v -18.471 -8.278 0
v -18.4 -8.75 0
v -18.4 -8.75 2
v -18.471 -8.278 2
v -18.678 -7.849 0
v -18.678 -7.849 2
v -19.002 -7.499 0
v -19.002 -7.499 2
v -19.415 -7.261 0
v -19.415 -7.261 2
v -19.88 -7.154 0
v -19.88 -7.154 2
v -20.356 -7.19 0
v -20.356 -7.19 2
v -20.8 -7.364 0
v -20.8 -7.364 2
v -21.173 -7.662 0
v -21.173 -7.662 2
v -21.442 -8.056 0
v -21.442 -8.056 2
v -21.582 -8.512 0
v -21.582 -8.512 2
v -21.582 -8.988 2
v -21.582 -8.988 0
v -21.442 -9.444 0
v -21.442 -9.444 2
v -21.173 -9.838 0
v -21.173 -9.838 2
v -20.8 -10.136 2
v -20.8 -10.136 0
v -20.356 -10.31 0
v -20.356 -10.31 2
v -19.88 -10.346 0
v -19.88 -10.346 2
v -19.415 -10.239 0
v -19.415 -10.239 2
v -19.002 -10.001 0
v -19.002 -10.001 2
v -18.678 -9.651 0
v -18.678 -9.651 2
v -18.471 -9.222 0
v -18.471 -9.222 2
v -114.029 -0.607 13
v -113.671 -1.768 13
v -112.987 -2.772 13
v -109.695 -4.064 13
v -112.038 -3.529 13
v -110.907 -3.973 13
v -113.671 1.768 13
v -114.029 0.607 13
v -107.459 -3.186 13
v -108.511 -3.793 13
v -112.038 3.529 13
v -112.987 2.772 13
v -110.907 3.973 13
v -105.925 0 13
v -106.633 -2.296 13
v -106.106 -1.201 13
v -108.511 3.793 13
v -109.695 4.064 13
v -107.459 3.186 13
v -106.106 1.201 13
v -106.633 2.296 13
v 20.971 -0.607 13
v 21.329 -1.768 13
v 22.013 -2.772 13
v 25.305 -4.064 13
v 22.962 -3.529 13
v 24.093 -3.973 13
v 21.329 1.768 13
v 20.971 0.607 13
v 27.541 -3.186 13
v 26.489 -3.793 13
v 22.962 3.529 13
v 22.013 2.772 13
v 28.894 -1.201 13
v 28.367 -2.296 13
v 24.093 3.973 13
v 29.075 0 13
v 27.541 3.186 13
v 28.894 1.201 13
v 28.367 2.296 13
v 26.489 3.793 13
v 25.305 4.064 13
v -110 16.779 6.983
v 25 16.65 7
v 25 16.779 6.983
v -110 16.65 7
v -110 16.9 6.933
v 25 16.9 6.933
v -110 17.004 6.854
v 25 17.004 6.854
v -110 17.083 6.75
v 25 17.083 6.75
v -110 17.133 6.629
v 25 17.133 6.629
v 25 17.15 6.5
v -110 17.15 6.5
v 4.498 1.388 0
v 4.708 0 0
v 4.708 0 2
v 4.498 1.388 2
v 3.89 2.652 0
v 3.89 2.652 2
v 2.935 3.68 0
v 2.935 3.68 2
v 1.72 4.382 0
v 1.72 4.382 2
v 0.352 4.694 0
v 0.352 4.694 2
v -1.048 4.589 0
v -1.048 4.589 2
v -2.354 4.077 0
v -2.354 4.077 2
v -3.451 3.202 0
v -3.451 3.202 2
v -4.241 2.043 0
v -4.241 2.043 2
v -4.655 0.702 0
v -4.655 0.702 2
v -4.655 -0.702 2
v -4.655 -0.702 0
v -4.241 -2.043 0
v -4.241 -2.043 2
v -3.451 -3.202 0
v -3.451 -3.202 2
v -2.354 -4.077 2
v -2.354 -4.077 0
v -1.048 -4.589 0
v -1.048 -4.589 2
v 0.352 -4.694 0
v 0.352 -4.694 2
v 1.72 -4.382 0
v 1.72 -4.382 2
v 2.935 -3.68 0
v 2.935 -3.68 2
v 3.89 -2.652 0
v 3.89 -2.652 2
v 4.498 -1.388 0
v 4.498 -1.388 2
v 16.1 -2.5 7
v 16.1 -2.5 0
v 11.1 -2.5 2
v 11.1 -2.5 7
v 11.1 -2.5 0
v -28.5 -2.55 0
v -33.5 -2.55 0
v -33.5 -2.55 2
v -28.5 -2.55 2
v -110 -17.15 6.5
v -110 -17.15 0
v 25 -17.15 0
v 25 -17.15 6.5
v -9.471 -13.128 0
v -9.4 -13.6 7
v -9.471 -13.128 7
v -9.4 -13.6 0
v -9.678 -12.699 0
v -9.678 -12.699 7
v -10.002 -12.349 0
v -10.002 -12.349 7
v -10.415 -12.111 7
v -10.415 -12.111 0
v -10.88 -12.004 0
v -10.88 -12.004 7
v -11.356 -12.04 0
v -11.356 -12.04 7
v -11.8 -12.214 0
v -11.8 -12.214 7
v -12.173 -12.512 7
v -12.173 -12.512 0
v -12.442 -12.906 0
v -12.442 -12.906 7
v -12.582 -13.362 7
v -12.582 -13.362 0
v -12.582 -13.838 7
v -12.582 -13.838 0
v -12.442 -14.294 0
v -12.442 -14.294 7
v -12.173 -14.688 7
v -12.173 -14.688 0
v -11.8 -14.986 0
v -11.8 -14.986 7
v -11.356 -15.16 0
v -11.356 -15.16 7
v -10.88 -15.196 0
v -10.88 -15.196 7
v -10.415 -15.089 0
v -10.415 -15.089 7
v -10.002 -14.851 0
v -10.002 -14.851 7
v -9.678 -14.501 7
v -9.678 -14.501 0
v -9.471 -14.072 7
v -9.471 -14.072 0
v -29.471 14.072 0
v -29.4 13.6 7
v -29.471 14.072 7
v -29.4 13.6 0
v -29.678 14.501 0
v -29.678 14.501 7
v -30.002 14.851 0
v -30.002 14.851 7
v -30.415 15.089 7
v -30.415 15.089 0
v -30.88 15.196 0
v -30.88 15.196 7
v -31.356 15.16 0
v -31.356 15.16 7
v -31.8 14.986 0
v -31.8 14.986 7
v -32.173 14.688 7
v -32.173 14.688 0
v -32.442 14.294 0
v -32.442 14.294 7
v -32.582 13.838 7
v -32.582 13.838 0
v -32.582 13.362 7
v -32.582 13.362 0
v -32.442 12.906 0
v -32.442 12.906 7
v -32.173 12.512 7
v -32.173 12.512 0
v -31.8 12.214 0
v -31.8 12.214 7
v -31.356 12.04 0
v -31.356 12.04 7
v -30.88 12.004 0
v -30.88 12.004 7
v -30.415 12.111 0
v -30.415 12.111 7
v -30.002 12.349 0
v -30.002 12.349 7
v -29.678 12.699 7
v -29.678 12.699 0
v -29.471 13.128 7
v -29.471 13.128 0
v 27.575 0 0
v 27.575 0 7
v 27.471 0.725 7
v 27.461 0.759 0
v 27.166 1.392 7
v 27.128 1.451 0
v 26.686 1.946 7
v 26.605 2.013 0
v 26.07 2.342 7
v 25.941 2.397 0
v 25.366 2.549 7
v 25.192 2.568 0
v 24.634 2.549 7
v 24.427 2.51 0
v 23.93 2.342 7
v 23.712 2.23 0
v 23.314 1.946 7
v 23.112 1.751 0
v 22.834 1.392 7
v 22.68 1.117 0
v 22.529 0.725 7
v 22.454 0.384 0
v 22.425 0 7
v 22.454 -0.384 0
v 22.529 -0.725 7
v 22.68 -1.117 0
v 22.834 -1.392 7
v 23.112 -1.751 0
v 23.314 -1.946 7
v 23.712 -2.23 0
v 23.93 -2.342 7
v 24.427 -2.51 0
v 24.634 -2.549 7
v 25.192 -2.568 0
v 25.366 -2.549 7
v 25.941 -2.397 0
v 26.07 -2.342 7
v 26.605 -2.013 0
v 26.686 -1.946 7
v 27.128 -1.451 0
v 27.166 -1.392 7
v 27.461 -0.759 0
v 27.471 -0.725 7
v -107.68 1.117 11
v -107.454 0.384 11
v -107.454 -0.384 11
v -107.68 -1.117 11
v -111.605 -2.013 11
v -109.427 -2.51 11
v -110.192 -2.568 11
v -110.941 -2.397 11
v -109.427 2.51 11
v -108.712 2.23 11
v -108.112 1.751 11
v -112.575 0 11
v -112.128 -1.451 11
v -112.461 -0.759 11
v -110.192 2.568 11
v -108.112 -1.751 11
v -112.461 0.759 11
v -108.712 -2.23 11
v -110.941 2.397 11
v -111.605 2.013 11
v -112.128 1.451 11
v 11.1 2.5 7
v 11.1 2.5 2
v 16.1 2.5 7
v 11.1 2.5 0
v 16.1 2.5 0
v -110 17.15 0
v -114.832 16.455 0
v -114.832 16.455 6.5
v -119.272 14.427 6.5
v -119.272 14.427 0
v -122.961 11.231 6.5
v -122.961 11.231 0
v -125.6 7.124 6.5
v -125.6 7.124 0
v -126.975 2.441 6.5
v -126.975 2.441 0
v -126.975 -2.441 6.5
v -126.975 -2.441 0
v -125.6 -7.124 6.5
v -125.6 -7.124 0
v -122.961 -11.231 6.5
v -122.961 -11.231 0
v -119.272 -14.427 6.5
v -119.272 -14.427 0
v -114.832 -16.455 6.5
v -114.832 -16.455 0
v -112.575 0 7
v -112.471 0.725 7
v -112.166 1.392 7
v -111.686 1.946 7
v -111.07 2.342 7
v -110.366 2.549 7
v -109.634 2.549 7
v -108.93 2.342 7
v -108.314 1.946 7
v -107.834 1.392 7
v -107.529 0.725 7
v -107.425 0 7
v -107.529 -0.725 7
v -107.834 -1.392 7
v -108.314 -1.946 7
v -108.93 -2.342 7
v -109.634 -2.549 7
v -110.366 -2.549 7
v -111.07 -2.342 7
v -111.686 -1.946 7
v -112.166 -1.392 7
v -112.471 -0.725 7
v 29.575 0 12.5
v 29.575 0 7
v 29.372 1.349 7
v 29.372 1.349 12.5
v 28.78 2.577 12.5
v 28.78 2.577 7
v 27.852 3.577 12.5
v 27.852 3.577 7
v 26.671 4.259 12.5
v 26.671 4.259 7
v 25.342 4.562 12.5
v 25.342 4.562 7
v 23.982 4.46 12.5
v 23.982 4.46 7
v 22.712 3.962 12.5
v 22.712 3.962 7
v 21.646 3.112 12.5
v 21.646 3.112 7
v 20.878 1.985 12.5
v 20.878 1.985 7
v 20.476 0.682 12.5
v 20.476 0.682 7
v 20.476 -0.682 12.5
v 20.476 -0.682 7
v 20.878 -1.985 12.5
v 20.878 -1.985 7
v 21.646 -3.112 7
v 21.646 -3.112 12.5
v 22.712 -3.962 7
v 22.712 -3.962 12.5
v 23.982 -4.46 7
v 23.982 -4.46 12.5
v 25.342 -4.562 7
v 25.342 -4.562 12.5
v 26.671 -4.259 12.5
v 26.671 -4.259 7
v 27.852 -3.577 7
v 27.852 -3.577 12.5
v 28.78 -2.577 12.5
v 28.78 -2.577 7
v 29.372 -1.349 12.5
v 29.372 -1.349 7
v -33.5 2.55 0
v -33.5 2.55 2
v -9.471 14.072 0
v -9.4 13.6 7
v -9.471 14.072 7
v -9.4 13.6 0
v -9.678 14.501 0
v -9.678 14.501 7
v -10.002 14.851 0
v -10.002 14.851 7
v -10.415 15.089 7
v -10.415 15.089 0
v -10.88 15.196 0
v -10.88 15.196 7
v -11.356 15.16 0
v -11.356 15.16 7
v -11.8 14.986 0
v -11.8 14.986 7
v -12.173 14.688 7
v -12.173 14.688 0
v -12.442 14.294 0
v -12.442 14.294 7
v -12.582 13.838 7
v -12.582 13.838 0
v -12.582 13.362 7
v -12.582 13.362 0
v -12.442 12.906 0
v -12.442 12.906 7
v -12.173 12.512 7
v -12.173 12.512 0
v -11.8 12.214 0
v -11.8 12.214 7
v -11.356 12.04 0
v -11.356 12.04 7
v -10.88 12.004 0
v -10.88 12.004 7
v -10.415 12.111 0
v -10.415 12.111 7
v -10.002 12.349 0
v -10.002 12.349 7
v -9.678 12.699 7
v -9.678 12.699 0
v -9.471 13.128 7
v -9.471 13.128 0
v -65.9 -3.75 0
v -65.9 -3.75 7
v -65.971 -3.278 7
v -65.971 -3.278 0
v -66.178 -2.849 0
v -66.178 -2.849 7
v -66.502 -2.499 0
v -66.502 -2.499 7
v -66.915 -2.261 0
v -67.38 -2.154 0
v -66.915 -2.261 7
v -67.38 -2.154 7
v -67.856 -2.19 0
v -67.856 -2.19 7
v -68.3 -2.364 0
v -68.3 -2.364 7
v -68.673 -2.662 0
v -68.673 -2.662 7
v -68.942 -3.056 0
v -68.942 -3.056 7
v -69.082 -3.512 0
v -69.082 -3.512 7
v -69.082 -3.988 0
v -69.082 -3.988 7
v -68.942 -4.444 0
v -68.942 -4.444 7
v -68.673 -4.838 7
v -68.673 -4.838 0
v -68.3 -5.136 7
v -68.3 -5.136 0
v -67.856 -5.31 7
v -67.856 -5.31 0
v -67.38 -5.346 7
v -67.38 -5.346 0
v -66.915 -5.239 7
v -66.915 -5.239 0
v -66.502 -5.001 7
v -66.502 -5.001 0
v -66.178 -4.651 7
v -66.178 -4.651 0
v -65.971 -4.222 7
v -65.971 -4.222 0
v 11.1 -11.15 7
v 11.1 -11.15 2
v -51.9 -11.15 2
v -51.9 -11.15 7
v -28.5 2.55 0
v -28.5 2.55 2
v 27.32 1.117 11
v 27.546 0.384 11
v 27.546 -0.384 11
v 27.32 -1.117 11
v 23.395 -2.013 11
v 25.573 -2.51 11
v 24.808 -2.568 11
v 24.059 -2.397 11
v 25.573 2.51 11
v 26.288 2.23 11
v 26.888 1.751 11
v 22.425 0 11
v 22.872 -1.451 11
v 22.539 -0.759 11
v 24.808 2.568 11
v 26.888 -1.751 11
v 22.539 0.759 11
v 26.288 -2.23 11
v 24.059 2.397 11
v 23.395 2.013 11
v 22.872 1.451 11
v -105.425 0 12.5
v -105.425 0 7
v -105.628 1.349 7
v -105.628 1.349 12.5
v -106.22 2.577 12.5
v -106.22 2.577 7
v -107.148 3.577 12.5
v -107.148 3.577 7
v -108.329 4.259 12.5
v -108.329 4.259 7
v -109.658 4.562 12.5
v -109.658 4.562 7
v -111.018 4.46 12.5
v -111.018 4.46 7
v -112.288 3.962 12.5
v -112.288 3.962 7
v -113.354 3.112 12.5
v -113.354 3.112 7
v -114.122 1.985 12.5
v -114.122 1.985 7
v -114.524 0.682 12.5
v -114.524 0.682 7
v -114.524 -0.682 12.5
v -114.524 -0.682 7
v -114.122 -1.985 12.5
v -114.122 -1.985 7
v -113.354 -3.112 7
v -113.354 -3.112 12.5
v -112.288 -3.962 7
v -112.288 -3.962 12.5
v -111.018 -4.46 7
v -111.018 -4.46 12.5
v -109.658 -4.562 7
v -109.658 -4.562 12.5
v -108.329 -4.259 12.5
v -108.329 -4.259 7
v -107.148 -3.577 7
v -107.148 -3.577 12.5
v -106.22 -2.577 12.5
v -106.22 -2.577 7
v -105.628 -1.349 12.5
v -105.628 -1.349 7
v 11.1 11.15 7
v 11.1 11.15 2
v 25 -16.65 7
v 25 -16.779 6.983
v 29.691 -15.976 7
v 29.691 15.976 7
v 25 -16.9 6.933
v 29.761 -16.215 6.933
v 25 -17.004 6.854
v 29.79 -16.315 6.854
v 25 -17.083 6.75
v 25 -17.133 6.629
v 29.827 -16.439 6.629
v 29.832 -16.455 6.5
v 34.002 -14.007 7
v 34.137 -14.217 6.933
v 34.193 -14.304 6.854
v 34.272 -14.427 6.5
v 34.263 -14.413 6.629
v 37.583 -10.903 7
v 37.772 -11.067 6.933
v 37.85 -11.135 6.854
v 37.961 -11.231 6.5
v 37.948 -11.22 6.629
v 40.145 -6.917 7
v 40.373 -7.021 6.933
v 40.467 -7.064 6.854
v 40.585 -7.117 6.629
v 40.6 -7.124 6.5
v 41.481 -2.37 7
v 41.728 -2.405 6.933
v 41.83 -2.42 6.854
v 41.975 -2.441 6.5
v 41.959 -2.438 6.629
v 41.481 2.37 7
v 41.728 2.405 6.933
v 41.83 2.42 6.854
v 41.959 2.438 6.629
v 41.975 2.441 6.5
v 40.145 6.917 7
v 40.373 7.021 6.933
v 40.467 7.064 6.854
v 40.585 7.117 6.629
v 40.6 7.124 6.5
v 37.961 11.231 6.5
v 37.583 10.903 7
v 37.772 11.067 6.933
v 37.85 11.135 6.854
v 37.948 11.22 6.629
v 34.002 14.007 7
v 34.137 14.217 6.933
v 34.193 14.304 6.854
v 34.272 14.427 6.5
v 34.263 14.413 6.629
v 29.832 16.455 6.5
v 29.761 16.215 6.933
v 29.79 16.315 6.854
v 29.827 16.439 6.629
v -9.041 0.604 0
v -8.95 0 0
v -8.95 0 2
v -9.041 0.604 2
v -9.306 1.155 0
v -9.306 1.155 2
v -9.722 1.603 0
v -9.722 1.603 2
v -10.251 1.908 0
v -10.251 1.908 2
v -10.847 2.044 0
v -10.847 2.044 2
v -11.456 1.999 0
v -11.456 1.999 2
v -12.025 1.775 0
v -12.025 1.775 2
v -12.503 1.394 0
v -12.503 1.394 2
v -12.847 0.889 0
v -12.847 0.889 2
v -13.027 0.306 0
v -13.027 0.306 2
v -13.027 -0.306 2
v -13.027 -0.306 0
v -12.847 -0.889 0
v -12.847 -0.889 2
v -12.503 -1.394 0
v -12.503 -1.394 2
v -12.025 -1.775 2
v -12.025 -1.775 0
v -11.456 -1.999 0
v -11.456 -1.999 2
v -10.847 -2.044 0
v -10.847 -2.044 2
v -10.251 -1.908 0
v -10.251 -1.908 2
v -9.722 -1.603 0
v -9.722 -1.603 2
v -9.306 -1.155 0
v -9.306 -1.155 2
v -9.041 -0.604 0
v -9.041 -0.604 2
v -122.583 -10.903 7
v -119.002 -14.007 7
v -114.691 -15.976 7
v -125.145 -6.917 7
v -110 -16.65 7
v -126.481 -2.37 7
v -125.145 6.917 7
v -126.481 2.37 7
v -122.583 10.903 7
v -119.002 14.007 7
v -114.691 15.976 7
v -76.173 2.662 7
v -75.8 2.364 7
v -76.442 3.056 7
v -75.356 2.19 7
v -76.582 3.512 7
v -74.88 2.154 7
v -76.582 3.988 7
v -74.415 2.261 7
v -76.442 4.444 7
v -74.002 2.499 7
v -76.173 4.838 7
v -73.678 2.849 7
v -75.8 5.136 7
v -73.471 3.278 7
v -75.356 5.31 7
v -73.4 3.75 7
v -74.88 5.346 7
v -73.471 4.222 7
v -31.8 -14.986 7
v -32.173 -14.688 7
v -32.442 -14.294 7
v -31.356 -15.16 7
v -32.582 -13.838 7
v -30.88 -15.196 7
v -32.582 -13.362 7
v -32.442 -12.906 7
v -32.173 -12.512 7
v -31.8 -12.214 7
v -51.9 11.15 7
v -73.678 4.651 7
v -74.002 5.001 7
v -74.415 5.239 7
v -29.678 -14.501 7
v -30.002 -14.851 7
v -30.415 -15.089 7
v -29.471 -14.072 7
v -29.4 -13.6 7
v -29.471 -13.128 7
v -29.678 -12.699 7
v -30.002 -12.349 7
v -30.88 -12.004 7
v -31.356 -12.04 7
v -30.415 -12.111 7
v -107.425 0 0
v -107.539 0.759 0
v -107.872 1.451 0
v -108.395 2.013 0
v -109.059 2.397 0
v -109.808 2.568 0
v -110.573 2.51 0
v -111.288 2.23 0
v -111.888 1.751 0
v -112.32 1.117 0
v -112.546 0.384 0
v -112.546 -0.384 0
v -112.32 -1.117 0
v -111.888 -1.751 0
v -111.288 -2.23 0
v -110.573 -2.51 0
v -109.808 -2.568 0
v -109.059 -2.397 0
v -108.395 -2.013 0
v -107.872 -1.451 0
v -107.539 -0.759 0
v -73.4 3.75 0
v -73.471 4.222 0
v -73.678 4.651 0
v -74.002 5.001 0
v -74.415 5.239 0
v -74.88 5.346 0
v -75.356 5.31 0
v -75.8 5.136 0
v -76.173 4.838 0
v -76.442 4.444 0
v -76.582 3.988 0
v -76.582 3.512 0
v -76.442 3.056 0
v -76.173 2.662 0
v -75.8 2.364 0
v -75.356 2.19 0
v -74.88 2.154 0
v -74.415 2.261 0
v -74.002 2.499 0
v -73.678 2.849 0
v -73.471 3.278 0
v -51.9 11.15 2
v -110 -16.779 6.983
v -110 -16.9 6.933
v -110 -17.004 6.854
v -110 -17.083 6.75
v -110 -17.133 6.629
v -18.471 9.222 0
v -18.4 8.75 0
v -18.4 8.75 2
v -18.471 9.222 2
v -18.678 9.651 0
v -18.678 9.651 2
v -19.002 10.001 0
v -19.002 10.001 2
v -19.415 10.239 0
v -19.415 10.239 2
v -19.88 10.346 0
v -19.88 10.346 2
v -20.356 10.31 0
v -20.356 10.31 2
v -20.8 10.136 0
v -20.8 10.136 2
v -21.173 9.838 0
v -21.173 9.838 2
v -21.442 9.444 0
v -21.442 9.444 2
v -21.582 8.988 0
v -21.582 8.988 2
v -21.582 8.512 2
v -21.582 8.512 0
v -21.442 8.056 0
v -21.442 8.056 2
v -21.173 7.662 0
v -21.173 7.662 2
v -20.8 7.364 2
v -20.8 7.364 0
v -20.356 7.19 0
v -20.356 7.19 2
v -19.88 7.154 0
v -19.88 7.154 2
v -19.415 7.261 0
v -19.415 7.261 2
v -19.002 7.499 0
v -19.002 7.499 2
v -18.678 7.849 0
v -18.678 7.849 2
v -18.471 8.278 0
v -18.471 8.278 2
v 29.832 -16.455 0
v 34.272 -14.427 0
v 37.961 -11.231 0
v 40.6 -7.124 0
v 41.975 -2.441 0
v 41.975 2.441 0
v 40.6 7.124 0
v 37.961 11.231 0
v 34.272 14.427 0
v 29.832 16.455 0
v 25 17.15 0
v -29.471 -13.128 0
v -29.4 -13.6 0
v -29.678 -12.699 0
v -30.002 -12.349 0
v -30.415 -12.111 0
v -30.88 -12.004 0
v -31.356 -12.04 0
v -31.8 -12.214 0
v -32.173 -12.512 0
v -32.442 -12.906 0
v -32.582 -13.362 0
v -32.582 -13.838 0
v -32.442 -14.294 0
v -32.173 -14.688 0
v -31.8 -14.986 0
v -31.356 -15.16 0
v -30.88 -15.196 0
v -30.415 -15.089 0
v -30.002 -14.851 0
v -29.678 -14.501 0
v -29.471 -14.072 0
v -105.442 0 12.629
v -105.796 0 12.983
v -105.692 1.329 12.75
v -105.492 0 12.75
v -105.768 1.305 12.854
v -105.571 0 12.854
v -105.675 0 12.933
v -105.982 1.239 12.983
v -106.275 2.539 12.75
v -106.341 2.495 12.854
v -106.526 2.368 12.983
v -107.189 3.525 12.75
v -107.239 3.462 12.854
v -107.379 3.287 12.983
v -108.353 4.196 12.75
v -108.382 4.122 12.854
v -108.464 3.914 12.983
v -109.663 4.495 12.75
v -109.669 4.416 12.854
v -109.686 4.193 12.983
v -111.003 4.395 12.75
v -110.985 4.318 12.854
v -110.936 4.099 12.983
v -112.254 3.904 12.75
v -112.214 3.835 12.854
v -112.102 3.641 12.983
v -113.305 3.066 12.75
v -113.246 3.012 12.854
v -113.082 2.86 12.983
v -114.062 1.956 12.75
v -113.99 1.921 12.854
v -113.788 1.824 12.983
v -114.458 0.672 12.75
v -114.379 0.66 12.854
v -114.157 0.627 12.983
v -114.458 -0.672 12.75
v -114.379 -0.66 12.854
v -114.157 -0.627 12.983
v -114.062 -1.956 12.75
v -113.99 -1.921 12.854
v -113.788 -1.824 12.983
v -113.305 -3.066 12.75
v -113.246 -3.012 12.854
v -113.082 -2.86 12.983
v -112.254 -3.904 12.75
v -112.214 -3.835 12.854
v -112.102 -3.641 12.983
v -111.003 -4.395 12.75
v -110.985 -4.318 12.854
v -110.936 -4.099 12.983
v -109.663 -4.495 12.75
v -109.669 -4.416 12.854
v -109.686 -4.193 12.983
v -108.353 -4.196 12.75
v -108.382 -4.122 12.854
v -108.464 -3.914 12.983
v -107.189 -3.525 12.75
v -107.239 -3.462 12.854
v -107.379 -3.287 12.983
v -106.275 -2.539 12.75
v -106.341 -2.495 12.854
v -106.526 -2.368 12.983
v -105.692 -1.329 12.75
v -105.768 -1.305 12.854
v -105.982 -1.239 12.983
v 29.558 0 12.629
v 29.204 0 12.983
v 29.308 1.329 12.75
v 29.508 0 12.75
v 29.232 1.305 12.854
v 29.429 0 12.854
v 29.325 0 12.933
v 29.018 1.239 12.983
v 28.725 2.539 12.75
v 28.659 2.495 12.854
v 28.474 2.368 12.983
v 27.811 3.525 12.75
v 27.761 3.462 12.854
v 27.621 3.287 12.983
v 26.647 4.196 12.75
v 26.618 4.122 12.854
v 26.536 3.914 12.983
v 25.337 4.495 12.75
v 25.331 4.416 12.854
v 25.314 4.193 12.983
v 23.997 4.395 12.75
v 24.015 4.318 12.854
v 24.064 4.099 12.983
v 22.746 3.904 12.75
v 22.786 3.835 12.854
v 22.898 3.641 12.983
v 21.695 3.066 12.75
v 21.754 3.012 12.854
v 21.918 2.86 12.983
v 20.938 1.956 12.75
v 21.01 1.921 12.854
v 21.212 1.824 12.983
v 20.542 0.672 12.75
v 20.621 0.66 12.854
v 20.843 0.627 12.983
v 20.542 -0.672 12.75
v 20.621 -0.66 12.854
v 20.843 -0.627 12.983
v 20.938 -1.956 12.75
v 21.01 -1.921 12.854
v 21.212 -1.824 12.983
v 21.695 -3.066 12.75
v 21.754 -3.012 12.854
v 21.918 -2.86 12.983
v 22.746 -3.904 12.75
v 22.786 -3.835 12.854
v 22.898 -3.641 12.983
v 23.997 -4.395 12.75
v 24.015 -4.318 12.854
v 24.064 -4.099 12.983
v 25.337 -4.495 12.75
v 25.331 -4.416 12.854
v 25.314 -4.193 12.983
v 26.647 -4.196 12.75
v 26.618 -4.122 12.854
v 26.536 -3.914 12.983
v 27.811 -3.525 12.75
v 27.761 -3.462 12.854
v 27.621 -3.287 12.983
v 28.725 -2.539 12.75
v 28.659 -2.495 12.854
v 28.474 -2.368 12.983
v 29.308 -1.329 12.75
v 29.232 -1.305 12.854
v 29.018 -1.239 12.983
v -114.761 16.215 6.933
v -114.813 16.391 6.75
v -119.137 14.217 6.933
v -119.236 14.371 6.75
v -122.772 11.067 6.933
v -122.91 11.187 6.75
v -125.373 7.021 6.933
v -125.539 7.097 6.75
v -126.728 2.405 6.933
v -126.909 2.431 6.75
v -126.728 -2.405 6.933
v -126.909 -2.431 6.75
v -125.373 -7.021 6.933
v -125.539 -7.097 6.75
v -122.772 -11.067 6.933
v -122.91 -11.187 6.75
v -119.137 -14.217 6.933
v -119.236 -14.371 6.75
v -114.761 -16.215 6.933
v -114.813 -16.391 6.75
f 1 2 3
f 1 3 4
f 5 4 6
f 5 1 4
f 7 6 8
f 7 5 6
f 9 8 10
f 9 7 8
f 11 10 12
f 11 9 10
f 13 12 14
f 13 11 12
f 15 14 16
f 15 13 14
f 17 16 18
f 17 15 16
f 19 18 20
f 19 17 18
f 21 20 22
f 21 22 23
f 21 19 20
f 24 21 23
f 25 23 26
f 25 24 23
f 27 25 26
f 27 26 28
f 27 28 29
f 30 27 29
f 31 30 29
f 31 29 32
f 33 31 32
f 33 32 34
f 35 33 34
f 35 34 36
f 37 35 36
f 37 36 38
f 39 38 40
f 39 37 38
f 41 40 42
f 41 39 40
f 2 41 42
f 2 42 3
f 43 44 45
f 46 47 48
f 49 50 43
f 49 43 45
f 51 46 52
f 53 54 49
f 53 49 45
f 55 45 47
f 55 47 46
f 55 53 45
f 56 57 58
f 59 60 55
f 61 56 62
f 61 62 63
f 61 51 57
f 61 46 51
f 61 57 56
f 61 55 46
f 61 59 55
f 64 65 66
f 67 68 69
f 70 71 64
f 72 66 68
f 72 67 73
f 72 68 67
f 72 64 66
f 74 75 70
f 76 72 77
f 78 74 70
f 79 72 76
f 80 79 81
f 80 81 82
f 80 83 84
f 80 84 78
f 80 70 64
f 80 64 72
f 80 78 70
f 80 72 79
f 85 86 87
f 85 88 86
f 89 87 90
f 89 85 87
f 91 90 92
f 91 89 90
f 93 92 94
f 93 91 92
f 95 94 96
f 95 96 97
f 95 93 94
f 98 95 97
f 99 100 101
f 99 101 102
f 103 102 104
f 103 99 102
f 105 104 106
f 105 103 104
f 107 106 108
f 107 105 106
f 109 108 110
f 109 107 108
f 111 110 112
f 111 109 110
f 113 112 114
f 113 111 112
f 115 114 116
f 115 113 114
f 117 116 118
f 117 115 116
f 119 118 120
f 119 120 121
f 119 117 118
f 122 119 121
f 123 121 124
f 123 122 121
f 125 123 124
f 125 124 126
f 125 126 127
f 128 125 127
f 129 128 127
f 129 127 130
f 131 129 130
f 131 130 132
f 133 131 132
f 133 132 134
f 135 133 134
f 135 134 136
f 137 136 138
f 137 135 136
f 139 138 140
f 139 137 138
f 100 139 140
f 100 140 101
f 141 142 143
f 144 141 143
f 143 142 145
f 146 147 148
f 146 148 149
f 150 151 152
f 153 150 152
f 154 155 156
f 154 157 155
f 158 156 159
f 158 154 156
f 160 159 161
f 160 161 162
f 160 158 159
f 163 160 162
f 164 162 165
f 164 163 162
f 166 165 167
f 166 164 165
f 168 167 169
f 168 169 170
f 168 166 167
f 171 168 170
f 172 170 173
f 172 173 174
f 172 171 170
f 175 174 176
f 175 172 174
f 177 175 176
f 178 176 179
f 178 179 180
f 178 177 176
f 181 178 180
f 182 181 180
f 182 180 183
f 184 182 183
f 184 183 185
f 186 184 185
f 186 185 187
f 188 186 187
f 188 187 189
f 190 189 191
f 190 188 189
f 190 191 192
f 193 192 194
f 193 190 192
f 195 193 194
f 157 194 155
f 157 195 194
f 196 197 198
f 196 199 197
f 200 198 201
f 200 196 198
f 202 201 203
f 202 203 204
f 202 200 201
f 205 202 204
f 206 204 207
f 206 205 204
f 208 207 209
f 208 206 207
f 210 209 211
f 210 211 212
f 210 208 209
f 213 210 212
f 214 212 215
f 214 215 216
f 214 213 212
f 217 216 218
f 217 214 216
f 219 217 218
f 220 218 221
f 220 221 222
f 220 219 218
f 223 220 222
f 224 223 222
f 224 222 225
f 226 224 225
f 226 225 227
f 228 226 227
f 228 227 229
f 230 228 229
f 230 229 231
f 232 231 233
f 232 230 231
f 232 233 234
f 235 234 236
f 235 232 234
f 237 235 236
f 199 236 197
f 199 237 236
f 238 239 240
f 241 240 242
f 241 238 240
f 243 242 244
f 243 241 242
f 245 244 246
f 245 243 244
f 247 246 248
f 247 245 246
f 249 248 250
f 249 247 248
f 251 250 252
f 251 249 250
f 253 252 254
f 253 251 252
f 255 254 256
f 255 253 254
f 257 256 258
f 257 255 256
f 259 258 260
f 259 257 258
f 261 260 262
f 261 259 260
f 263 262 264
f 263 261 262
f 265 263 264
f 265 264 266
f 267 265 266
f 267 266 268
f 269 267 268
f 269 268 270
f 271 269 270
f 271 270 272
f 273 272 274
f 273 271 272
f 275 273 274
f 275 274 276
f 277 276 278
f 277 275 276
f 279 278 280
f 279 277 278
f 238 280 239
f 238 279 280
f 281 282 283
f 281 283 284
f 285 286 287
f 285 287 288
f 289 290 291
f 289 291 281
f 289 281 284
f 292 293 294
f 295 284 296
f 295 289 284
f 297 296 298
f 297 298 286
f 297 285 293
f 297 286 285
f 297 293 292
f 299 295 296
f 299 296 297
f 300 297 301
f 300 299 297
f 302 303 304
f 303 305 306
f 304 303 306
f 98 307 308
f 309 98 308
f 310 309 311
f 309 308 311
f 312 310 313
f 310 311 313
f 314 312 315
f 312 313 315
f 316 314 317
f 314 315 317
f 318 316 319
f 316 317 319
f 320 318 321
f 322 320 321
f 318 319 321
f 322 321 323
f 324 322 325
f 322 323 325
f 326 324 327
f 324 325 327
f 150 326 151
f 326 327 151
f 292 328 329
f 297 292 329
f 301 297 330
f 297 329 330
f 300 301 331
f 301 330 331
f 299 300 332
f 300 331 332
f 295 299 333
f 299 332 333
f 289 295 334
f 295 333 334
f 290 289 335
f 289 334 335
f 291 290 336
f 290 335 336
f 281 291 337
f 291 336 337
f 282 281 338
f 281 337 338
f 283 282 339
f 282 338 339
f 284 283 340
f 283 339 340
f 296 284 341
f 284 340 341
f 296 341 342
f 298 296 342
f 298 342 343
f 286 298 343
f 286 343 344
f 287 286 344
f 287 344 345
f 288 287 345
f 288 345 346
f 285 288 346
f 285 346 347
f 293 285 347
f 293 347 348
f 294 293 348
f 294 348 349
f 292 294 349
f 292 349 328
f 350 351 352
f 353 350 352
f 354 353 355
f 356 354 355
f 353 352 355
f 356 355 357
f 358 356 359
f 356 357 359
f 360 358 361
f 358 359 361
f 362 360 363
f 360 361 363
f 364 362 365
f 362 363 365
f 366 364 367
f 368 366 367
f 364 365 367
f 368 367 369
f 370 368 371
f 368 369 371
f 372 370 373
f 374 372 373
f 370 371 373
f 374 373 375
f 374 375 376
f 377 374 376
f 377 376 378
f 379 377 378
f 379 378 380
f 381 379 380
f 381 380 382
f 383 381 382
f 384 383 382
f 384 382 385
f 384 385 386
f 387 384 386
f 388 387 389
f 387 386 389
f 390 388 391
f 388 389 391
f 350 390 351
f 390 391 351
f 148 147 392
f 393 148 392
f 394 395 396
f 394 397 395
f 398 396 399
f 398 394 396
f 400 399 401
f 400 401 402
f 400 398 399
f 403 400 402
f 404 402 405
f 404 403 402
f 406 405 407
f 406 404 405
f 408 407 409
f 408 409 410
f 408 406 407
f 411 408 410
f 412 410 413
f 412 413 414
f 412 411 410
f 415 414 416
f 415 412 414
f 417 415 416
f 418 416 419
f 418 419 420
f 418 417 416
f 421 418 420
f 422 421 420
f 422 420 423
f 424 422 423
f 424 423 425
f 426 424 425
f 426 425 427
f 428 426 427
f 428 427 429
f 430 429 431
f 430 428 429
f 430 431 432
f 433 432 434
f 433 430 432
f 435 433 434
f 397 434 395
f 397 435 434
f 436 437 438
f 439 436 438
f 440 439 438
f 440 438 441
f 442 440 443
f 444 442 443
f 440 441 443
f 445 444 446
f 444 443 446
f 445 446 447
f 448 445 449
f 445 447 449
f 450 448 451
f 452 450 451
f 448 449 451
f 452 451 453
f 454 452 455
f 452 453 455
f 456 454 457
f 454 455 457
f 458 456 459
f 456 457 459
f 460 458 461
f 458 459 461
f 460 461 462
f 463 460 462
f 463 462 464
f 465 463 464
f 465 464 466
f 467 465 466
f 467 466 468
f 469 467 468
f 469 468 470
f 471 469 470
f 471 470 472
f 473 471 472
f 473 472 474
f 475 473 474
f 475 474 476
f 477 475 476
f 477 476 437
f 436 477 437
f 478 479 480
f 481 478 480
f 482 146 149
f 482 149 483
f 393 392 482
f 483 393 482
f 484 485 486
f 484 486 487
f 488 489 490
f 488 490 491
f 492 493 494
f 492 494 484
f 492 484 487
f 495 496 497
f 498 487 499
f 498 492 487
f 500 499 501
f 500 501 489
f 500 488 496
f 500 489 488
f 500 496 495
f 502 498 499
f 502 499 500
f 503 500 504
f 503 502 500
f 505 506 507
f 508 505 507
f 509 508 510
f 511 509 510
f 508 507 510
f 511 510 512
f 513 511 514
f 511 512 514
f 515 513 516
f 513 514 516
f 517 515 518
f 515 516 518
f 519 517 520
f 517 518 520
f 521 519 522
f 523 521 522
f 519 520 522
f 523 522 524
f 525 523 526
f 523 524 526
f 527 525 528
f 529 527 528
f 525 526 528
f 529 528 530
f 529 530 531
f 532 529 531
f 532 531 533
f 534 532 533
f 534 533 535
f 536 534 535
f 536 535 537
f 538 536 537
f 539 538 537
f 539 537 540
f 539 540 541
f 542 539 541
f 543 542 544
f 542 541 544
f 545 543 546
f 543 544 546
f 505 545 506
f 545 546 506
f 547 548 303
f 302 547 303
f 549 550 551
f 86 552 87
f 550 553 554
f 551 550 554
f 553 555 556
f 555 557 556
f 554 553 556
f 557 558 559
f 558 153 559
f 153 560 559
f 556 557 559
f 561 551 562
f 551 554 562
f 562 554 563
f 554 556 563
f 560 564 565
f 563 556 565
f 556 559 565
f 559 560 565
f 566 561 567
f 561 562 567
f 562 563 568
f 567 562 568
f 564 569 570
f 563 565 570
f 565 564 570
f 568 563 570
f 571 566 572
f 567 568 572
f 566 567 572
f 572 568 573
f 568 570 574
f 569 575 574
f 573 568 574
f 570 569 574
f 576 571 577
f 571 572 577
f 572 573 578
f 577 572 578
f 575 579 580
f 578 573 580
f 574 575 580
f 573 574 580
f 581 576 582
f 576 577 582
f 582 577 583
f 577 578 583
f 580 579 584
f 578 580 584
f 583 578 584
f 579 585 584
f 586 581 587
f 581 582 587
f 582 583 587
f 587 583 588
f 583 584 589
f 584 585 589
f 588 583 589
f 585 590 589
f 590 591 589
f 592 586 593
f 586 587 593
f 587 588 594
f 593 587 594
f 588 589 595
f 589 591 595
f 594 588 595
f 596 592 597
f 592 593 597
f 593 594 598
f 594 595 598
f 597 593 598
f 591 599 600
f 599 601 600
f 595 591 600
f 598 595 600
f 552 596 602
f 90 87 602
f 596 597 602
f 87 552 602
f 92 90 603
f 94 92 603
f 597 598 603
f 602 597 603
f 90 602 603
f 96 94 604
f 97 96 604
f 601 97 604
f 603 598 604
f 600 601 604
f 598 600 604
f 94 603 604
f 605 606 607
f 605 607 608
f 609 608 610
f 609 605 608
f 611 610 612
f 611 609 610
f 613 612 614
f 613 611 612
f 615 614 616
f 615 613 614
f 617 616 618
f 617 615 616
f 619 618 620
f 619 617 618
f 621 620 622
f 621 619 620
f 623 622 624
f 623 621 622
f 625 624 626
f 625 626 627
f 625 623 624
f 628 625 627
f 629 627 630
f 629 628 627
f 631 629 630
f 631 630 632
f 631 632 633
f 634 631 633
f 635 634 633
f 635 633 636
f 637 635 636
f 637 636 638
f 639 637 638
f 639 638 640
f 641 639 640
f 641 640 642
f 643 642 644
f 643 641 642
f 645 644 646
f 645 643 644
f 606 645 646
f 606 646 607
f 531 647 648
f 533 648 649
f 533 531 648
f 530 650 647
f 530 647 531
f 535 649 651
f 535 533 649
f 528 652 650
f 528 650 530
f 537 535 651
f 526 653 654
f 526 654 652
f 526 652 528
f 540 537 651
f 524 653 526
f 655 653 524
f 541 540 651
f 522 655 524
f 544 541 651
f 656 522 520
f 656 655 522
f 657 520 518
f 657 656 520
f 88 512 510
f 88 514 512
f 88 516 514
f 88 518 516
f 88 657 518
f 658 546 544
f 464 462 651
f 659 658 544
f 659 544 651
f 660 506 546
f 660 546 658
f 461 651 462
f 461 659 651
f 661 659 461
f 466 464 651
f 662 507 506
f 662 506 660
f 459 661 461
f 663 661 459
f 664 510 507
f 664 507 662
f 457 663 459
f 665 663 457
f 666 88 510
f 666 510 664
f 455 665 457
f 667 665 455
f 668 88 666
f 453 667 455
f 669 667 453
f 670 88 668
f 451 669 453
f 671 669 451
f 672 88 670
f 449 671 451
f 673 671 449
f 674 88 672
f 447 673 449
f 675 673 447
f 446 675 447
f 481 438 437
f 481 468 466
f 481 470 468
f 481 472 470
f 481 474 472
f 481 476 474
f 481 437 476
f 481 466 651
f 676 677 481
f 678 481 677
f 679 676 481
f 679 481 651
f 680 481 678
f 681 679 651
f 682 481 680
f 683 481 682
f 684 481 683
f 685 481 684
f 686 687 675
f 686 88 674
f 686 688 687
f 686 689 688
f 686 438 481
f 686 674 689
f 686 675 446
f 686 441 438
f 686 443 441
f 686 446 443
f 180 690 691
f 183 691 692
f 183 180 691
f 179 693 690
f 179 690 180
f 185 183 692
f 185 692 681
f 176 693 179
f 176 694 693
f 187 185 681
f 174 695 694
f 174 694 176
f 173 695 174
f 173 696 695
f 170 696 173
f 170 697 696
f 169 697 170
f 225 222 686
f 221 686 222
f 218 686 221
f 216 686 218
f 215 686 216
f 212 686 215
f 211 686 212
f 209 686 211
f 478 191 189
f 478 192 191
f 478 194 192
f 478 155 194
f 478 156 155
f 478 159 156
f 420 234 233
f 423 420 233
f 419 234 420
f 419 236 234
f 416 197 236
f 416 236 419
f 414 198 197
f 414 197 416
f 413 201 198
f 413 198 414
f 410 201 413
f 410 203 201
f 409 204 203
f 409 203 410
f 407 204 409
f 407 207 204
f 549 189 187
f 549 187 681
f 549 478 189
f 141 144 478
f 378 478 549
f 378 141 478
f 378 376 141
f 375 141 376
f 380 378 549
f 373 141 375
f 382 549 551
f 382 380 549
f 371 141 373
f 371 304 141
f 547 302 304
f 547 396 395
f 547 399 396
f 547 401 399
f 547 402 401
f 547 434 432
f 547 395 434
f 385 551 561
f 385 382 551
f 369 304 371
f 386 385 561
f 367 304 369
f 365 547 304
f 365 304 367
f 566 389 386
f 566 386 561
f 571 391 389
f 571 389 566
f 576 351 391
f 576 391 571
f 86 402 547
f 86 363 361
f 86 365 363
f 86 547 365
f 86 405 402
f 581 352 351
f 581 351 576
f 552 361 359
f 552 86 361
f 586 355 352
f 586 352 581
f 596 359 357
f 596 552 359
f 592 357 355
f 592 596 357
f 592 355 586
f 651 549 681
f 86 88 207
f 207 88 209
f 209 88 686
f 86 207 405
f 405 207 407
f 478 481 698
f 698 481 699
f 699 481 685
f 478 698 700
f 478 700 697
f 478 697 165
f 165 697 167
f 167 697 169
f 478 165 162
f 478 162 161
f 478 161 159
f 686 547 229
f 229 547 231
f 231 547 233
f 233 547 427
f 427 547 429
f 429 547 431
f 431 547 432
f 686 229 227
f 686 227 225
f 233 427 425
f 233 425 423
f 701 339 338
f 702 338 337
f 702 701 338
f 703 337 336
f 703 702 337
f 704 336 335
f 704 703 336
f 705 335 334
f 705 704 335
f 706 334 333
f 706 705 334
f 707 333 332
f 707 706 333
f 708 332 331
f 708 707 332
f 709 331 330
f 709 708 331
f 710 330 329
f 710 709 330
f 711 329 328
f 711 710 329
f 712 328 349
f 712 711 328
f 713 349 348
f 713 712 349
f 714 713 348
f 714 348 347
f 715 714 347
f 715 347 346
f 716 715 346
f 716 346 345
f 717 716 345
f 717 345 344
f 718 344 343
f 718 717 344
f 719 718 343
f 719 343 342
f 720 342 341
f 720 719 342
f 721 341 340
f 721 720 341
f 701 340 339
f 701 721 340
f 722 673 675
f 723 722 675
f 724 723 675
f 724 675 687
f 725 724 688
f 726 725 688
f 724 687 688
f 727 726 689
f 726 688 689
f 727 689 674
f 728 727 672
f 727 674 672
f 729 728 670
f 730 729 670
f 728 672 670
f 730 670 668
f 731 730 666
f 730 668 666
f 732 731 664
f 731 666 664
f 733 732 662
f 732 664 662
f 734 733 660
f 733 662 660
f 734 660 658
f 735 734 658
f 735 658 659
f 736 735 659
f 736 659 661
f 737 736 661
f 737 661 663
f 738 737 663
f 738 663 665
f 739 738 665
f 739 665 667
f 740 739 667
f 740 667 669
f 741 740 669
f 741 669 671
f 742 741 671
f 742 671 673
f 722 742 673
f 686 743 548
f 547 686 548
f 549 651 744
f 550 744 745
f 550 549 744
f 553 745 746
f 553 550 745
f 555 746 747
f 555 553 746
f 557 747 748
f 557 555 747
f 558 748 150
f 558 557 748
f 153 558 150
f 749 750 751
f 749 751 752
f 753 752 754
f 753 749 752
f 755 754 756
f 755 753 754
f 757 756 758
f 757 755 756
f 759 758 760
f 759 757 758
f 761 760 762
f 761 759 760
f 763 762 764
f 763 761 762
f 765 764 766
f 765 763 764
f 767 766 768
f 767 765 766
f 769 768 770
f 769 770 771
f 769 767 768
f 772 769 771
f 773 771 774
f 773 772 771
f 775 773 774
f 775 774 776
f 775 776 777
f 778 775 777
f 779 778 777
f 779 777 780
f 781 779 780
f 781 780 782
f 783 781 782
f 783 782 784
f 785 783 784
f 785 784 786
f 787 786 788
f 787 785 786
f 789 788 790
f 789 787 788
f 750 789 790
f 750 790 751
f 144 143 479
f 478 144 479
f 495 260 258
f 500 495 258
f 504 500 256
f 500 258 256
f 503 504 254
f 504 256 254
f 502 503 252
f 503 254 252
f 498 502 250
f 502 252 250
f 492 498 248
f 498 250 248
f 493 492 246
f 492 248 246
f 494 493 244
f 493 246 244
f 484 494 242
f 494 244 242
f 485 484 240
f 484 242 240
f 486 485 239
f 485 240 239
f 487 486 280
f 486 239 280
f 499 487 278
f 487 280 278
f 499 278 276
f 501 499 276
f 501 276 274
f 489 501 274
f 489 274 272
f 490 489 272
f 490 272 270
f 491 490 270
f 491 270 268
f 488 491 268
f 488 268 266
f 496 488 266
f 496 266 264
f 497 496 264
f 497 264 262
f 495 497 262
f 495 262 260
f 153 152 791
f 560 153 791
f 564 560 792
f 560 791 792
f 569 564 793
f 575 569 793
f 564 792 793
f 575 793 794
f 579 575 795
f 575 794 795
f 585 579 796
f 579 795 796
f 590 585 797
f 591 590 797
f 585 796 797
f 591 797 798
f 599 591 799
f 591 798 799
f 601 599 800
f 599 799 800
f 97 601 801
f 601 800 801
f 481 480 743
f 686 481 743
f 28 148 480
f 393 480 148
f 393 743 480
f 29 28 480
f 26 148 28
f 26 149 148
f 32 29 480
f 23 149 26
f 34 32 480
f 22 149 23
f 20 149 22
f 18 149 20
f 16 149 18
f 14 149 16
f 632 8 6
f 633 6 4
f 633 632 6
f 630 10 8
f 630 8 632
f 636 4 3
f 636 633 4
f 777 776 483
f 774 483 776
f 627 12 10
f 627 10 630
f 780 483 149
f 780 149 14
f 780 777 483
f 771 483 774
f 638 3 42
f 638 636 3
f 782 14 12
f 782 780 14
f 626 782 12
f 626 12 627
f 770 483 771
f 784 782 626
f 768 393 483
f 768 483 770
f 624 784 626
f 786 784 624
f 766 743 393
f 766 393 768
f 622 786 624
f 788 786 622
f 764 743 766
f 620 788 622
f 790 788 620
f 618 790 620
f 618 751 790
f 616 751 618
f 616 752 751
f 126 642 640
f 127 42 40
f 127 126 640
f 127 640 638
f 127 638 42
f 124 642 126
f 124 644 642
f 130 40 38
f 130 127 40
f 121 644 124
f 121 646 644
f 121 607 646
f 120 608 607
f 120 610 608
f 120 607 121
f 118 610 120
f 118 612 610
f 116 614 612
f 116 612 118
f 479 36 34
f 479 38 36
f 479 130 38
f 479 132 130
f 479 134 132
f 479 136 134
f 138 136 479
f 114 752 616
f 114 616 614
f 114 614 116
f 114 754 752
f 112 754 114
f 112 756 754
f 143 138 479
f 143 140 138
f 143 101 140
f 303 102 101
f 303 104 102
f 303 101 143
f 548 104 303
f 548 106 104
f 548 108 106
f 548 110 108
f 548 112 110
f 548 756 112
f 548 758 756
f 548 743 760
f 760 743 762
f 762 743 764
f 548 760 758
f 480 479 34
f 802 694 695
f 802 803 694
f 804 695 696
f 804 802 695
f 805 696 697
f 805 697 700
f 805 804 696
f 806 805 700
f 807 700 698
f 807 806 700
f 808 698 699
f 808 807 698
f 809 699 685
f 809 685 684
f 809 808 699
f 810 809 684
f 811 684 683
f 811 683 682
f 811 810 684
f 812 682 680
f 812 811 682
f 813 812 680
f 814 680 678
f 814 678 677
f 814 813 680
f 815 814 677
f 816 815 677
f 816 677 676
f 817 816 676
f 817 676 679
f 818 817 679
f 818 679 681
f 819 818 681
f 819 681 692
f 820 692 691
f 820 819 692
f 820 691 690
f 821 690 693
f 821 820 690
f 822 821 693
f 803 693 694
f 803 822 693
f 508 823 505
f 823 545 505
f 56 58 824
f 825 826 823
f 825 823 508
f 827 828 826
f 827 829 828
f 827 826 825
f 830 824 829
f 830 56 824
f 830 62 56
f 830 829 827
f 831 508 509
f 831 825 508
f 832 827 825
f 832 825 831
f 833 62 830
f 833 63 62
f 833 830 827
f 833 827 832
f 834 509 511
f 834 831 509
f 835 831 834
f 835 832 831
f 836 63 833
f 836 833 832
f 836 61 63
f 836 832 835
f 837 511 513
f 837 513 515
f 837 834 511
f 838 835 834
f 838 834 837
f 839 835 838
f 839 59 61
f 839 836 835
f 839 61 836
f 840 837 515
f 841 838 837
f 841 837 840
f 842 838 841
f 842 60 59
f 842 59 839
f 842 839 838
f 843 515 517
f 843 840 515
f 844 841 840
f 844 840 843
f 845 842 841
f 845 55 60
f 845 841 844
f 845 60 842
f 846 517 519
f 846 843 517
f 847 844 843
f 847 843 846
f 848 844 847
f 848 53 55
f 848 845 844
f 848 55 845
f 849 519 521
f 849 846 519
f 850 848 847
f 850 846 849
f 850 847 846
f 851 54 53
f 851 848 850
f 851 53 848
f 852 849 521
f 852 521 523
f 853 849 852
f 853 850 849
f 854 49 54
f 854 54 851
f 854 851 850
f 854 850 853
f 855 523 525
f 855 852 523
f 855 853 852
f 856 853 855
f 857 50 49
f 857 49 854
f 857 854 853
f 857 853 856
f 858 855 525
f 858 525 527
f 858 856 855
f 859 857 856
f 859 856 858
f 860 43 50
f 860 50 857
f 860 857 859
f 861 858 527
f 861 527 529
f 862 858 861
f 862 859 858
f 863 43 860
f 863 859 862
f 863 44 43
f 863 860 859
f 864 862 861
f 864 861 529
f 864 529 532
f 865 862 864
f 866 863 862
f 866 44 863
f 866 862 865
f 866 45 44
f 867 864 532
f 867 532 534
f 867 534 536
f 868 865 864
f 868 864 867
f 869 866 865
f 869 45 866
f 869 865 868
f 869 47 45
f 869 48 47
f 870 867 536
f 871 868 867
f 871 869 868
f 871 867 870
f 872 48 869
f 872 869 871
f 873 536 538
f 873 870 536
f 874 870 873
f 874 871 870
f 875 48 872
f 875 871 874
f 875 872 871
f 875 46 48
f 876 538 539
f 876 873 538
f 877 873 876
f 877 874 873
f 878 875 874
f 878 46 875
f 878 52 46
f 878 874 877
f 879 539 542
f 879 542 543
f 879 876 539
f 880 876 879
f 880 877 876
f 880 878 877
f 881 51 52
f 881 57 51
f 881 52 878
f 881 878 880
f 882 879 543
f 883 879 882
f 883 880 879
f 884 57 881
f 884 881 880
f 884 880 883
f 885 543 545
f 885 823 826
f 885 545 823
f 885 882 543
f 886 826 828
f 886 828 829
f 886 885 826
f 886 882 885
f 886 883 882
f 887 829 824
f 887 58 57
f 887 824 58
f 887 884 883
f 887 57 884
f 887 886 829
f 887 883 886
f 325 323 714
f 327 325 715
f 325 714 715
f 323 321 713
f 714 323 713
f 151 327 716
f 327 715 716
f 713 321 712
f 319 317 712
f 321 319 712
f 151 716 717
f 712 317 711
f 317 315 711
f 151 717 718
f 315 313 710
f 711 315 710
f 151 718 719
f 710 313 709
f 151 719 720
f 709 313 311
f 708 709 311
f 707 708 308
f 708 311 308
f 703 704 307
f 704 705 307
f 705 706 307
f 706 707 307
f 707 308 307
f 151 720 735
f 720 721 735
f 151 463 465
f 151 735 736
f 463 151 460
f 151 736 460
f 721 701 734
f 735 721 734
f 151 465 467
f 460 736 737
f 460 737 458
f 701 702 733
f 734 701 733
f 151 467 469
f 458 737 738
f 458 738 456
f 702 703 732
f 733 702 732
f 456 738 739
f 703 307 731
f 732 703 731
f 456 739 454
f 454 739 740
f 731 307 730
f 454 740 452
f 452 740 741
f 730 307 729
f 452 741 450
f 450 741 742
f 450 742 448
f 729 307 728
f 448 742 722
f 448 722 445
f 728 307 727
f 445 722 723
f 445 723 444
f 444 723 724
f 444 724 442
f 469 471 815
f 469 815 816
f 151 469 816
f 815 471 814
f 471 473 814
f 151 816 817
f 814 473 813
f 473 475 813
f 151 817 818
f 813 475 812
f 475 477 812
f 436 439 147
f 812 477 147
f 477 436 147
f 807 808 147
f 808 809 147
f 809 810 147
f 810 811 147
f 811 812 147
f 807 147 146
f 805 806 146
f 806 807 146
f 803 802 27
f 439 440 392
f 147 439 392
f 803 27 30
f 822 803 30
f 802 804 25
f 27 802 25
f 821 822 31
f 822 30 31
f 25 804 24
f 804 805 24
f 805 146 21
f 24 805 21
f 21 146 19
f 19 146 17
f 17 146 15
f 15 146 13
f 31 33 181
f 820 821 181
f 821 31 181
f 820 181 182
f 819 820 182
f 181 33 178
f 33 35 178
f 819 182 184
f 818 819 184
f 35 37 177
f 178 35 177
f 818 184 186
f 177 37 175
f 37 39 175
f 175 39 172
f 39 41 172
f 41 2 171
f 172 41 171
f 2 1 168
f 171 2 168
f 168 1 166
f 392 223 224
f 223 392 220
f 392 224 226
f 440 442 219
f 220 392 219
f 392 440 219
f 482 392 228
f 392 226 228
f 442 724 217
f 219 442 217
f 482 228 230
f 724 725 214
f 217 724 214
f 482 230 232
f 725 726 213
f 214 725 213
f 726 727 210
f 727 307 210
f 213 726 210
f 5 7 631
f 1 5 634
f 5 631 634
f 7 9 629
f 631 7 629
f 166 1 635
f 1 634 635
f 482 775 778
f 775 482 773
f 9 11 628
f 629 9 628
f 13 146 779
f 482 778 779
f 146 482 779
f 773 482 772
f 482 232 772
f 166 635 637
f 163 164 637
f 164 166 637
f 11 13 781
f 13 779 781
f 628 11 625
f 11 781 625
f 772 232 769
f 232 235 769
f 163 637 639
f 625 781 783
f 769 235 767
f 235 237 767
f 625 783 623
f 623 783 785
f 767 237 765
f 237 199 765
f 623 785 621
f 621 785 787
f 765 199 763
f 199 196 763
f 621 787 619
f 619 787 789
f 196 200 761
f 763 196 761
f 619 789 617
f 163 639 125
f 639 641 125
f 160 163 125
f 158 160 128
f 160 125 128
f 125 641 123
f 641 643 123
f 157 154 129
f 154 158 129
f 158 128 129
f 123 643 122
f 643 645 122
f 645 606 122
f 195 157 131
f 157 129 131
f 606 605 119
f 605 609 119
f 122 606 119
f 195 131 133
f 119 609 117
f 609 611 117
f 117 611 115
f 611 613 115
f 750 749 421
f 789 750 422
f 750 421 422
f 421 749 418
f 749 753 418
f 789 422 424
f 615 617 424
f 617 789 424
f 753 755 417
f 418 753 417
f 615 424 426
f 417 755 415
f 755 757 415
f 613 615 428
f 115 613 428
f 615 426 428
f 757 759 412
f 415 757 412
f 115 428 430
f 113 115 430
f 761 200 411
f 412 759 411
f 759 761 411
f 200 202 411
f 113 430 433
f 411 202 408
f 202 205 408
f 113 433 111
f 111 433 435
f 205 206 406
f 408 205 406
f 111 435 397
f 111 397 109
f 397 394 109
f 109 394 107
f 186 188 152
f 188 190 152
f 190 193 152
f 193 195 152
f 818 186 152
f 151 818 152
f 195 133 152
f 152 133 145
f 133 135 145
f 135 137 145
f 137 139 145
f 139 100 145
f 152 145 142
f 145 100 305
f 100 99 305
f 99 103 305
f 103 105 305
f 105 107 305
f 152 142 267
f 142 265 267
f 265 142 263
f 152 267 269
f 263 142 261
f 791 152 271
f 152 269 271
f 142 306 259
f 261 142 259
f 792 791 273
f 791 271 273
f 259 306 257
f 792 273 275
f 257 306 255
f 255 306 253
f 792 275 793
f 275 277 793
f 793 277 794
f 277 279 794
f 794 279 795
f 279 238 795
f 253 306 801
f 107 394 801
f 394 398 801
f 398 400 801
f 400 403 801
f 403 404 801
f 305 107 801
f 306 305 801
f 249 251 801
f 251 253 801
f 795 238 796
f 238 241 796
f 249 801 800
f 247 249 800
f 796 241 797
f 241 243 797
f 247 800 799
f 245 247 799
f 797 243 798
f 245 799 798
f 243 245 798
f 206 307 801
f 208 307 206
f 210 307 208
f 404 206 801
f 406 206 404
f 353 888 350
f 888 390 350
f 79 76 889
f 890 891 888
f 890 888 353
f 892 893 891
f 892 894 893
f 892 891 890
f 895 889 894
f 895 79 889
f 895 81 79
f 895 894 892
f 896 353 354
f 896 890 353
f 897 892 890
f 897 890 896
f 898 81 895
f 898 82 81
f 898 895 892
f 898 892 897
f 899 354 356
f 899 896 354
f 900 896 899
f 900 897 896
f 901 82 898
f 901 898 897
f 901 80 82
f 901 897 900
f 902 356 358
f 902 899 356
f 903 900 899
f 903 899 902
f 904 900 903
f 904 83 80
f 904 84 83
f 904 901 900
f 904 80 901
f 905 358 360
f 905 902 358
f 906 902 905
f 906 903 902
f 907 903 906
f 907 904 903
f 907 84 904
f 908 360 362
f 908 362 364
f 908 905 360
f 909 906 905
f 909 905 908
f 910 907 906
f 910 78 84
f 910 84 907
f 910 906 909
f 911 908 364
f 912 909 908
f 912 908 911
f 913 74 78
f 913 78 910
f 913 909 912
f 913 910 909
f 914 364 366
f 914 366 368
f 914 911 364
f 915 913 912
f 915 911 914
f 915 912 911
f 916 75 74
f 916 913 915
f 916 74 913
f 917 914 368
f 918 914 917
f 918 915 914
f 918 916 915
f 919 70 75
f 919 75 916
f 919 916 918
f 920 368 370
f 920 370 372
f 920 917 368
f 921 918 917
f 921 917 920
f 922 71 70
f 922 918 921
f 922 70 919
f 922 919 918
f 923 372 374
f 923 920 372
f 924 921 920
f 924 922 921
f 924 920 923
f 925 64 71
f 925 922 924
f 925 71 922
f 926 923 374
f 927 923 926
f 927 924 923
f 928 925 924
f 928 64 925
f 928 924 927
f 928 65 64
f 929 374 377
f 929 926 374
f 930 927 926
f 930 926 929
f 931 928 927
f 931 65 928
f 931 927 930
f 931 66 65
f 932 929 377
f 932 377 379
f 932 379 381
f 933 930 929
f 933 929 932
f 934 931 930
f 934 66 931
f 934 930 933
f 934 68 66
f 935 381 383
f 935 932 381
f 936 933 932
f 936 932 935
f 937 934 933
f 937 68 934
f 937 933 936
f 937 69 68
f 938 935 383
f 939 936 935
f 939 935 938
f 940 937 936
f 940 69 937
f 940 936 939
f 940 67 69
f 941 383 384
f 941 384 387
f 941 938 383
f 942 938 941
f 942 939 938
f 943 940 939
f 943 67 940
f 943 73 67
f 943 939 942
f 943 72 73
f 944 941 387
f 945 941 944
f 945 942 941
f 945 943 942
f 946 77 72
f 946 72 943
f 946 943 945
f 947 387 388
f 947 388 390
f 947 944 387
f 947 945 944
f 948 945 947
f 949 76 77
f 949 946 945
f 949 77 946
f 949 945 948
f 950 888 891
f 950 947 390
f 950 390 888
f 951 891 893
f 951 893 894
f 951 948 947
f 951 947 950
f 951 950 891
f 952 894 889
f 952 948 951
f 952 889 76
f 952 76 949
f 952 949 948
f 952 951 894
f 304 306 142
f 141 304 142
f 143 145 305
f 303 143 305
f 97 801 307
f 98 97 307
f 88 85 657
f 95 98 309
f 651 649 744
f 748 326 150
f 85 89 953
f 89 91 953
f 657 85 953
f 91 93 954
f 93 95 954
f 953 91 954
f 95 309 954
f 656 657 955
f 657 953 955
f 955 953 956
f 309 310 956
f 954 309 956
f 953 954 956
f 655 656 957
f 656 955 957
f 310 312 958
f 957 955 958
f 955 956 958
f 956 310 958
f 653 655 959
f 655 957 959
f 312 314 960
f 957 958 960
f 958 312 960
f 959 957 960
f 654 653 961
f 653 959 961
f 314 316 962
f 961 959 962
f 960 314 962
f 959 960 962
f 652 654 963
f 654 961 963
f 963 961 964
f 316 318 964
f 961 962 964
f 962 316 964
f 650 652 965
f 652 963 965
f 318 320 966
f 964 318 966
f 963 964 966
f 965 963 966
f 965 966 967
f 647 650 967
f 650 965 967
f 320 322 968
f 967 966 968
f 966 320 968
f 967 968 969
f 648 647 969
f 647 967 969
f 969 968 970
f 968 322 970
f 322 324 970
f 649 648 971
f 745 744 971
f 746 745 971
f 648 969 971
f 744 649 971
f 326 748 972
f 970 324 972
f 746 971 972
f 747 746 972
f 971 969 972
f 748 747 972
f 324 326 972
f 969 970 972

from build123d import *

# Parameters (mm, degrees)
SKETCH6_R              = 1.6
SKETCH6_R_2            = 2.575
SKETCH6_W              = 5
SKETCH6_H              = 5
SKETCH6_H_2            = 5.1
SKETCH6_R_3            = 2.05
SKETCH6_R_4            = 4.707512696
BOSS_EXTRUDE4_DEPTH    = 2
SKETCH7_R              = 1.6
SKETCH7_R_2            = 2.575
BOSS_EXTRUDE5_DEPTH    = 5
SKETCH8_R              = 1.6
MIDSECTION_HOLES_DEPTH = 8
SKETCH12_R             = 4.575
BOSS_EXTRUDE6_DEPTH    = 6
SKETCH13_R             = 2.575
CUT_EXTRUDE4_DEPTH     = 4
FILLET1_R              = 0.5


with BuildPart() as part:
    # Sketch6 → Boss-Extrude4 (new body)
    with BuildSketch(Plane.XY):
        with BuildLine():
            Line((25, 17.15), (-110, 17.15))
            ThreePointArc((-110, 17.15), (-127.15, 0), (-110, -17.15))
            Line((-110, -17.15), (25, -17.15))
            ThreePointArc((25, -17.15), (42.15, 0), (25, 17.15))
        make_face()
        with Locations((-31, -13.6)):
            Circle(SKETCH6_R, mode=Mode.SUBTRACT)
        with Locations((-11, -13.6)):
            Circle(SKETCH6_R, mode=Mode.SUBTRACT)
        with Locations((-110, 0)):
            Circle(SKETCH6_R_2, mode=Mode.SUBTRACT)
        with Locations((13.6, 0)):
            Rectangle(SKETCH6_W, SKETCH6_H, mode=Mode.SUBTRACT)
        with Locations((25, 0)):
            Circle(SKETCH6_R_2, mode=Mode.SUBTRACT)
        with Locations((-31, 13.6)):
            Circle(SKETCH6_R, mode=Mode.SUBTRACT)
        with Locations((-11, 13.6)):
            Circle(SKETCH6_R, mode=Mode.SUBTRACT)
        with Locations((-31, 0)):
            Rectangle(SKETCH6_W, SKETCH6_H_2, mode=Mode.SUBTRACT)
        with Locations((-11, 0)):
            Circle(SKETCH6_R_3, mode=Mode.SUBTRACT)
        Circle(SKETCH6_R_4, mode=Mode.SUBTRACT)
        with Locations((-20, 8.75)):
            Circle(SKETCH6_R, mode=Mode.SUBTRACT)
        with Locations((-20, -8.75)):
            Circle(SKETCH6_R, mode=Mode.SUBTRACT)
    extrude(amount=BOSS_EXTRUDE4_DEPTH)

    # Sketch7 → Boss-Extrude5 (add)
    with BuildSketch(Plane.XY.offset(2)):
        with BuildLine():
            Line((25, 17.15), (-110, 17.15))
            ThreePointArc((-110, 17.15), (-127.15, 0), (-110, -17.15))
            Line((-110, -17.15), (25, -17.15))
            ThreePointArc((25, -17.15), (42.15, 0), (25, 17.15))
        make_face()
        with Locations((-31, -13.6)):
            Circle(SKETCH7_R, mode=Mode.SUBTRACT)
        with Locations((-11, -13.6)):
            Circle(SKETCH7_R, mode=Mode.SUBTRACT)
        with Locations((-110, 0)):
            Circle(SKETCH7_R_2, mode=Mode.SUBTRACT)
        Polygon((-51.9, -11.15), (-51.9, 11.15), (11.1, 11.15), (11.1, 2.5), (16.1, 2.5), (16.1, -2.5), (11.1, -2.5), (11.1, -11.15), align=None, mode=Mode.SUBTRACT)
        with Locations((25, 0)):
            Circle(SKETCH7_R_2, mode=Mode.SUBTRACT)
        with Locations((-31, 13.6)):
            Circle(SKETCH7_R, mode=Mode.SUBTRACT)
        with Locations((-11, 13.6)):
            Circle(SKETCH7_R, mode=Mode.SUBTRACT)
    extrude(amount=BOSS_EXTRUDE5_DEPTH)

    # Sketch8 → midsection_holes (cut, through all)
    with BuildSketch(Plane.XY.offset(7)):
        with Locations((-75, 3.75)):
            Circle(SKETCH8_R)
        with Locations((-67.5, -3.75)):
            Circle(SKETCH8_R)
    extrude(amount=-MIDSECTION_HOLES_DEPTH, mode=Mode.SUBTRACT)

    # Sketch12 → Boss-Extrude6 (add)
    with BuildSketch(Plane.XY.offset(7)):
        with Locations((-110, 0)):
            Circle(SKETCH12_R)
        with Locations((25, 0)):
            Circle(SKETCH12_R)
    extrude(amount=BOSS_EXTRUDE6_DEPTH)

    # Sketch13 → Cut-Extrude4 (cut)
    with BuildSketch(Plane(origin=(0, 0, 7), x_dir=(-1, 0, 0), z_dir=(0, 0, -1))):
        with Locations((-25, 0)):
            Circle(SKETCH13_R)
        with Locations((110, 0)):
            Circle(SKETCH13_R)
    extrude(amount=-CUT_EXTRUDE4_DEPTH, mode=Mode.SUBTRACT)

    # Fillet1
    fillet1_edges = [part.edges().sort_by_distance(p)[0] for p in [
        (-114.575, 0, 13),
        (20.425, 0, 13),
        (-127.15, 0, 7),
        (-42.5, -17.15, 7),
        (42.15, 0, 7),
        (-42.5, 17.15, 7),
    ]]
    fillet(fillet1_edges, radius=FILLET1_R)


solid = part.part
